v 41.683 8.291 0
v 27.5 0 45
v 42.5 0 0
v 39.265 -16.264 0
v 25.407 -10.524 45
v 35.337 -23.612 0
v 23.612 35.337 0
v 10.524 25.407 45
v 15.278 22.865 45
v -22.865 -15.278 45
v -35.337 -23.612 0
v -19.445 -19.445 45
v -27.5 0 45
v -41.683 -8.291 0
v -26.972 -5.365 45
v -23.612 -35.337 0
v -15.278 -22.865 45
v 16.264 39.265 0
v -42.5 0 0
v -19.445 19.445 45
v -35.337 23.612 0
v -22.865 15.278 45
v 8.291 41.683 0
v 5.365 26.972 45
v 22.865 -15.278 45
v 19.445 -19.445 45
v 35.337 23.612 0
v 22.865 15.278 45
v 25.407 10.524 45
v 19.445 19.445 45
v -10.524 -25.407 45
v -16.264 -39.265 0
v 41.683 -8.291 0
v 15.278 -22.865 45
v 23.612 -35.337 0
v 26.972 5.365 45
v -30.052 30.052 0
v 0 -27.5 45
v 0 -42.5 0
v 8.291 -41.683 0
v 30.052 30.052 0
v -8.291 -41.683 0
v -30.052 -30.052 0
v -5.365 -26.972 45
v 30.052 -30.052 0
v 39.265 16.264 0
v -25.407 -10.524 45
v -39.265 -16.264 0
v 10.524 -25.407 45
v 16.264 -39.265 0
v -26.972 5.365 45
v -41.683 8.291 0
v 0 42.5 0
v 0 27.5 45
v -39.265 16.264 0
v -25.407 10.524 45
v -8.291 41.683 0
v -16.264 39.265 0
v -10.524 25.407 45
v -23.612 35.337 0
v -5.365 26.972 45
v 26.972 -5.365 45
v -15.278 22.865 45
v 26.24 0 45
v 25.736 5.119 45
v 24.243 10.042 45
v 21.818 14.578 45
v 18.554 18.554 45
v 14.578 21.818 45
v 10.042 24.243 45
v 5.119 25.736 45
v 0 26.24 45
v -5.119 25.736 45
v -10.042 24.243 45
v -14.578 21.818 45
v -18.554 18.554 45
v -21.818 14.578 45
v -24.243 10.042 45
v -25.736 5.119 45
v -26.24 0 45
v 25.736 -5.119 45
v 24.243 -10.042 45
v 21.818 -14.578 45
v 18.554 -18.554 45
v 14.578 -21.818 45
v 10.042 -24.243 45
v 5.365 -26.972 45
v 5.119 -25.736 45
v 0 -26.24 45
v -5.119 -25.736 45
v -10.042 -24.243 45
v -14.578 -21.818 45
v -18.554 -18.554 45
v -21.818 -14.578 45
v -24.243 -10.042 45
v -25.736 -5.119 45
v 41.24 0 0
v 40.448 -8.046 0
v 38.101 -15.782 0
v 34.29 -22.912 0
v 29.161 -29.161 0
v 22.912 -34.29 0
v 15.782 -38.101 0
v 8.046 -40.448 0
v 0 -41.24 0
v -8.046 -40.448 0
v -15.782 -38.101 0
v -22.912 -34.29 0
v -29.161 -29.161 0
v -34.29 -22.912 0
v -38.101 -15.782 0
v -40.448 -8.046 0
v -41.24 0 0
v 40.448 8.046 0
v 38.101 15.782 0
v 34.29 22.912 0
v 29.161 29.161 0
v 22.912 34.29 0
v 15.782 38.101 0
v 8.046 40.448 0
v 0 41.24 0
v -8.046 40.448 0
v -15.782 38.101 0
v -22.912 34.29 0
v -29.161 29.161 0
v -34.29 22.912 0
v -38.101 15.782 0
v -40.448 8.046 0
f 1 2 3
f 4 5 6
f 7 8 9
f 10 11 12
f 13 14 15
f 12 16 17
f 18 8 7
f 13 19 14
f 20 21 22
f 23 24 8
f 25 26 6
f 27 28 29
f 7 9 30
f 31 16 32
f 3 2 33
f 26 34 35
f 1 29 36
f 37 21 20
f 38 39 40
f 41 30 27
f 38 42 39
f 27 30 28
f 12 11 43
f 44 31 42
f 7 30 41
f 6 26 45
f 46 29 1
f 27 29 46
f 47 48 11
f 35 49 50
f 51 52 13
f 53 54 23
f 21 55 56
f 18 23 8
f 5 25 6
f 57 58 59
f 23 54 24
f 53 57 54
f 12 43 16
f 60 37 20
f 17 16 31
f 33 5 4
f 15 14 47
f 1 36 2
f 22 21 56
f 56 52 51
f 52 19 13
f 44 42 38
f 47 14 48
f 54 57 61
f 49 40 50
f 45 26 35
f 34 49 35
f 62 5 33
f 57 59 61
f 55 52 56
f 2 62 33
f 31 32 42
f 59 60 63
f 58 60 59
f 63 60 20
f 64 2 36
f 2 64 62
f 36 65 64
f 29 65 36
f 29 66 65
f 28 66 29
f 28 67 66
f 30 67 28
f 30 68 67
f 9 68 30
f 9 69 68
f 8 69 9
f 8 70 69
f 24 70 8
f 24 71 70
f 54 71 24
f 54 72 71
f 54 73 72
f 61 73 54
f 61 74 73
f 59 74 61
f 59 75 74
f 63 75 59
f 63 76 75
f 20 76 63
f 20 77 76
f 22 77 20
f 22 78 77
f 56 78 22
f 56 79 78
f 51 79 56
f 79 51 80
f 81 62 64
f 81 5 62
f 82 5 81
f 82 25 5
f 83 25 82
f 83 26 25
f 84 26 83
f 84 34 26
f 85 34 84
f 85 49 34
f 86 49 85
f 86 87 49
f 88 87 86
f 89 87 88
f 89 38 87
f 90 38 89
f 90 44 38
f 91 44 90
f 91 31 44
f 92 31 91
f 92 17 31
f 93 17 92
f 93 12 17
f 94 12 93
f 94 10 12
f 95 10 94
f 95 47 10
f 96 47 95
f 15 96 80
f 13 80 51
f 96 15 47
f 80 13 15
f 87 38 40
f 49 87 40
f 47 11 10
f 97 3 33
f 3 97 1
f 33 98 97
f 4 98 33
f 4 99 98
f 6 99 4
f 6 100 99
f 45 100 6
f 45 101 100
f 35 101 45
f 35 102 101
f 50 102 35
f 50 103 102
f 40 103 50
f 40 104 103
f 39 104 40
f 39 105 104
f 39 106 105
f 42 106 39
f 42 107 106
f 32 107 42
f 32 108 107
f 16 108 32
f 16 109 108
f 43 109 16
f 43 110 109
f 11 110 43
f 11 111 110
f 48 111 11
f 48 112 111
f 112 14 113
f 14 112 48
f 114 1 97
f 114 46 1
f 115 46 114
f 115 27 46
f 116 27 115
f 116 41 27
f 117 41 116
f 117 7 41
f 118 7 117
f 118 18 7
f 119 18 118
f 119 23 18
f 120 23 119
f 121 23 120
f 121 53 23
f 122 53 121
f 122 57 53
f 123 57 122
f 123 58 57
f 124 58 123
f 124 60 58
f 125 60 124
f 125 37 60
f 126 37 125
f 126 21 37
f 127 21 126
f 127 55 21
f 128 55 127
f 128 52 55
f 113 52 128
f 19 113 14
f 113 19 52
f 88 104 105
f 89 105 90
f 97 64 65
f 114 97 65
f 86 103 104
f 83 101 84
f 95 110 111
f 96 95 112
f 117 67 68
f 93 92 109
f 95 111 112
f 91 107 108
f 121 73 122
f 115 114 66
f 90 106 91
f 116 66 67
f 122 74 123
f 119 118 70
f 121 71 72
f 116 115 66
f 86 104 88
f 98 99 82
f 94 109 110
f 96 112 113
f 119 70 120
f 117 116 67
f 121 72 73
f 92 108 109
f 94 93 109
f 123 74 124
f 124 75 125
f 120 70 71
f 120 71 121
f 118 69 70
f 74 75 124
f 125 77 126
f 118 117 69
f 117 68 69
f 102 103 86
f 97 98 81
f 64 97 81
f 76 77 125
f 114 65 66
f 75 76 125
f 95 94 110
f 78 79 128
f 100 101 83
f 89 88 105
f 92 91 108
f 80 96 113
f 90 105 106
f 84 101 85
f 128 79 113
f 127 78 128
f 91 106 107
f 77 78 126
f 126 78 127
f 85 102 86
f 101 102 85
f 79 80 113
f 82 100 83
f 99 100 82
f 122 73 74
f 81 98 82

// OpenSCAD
$fn=32;

h=45;
r1=85/2;
r2=55/2;
t=1.26;


difference()
{
    cylinder(h,r1,r2);
    cylinder(h,r1-t,r2-t);
}
